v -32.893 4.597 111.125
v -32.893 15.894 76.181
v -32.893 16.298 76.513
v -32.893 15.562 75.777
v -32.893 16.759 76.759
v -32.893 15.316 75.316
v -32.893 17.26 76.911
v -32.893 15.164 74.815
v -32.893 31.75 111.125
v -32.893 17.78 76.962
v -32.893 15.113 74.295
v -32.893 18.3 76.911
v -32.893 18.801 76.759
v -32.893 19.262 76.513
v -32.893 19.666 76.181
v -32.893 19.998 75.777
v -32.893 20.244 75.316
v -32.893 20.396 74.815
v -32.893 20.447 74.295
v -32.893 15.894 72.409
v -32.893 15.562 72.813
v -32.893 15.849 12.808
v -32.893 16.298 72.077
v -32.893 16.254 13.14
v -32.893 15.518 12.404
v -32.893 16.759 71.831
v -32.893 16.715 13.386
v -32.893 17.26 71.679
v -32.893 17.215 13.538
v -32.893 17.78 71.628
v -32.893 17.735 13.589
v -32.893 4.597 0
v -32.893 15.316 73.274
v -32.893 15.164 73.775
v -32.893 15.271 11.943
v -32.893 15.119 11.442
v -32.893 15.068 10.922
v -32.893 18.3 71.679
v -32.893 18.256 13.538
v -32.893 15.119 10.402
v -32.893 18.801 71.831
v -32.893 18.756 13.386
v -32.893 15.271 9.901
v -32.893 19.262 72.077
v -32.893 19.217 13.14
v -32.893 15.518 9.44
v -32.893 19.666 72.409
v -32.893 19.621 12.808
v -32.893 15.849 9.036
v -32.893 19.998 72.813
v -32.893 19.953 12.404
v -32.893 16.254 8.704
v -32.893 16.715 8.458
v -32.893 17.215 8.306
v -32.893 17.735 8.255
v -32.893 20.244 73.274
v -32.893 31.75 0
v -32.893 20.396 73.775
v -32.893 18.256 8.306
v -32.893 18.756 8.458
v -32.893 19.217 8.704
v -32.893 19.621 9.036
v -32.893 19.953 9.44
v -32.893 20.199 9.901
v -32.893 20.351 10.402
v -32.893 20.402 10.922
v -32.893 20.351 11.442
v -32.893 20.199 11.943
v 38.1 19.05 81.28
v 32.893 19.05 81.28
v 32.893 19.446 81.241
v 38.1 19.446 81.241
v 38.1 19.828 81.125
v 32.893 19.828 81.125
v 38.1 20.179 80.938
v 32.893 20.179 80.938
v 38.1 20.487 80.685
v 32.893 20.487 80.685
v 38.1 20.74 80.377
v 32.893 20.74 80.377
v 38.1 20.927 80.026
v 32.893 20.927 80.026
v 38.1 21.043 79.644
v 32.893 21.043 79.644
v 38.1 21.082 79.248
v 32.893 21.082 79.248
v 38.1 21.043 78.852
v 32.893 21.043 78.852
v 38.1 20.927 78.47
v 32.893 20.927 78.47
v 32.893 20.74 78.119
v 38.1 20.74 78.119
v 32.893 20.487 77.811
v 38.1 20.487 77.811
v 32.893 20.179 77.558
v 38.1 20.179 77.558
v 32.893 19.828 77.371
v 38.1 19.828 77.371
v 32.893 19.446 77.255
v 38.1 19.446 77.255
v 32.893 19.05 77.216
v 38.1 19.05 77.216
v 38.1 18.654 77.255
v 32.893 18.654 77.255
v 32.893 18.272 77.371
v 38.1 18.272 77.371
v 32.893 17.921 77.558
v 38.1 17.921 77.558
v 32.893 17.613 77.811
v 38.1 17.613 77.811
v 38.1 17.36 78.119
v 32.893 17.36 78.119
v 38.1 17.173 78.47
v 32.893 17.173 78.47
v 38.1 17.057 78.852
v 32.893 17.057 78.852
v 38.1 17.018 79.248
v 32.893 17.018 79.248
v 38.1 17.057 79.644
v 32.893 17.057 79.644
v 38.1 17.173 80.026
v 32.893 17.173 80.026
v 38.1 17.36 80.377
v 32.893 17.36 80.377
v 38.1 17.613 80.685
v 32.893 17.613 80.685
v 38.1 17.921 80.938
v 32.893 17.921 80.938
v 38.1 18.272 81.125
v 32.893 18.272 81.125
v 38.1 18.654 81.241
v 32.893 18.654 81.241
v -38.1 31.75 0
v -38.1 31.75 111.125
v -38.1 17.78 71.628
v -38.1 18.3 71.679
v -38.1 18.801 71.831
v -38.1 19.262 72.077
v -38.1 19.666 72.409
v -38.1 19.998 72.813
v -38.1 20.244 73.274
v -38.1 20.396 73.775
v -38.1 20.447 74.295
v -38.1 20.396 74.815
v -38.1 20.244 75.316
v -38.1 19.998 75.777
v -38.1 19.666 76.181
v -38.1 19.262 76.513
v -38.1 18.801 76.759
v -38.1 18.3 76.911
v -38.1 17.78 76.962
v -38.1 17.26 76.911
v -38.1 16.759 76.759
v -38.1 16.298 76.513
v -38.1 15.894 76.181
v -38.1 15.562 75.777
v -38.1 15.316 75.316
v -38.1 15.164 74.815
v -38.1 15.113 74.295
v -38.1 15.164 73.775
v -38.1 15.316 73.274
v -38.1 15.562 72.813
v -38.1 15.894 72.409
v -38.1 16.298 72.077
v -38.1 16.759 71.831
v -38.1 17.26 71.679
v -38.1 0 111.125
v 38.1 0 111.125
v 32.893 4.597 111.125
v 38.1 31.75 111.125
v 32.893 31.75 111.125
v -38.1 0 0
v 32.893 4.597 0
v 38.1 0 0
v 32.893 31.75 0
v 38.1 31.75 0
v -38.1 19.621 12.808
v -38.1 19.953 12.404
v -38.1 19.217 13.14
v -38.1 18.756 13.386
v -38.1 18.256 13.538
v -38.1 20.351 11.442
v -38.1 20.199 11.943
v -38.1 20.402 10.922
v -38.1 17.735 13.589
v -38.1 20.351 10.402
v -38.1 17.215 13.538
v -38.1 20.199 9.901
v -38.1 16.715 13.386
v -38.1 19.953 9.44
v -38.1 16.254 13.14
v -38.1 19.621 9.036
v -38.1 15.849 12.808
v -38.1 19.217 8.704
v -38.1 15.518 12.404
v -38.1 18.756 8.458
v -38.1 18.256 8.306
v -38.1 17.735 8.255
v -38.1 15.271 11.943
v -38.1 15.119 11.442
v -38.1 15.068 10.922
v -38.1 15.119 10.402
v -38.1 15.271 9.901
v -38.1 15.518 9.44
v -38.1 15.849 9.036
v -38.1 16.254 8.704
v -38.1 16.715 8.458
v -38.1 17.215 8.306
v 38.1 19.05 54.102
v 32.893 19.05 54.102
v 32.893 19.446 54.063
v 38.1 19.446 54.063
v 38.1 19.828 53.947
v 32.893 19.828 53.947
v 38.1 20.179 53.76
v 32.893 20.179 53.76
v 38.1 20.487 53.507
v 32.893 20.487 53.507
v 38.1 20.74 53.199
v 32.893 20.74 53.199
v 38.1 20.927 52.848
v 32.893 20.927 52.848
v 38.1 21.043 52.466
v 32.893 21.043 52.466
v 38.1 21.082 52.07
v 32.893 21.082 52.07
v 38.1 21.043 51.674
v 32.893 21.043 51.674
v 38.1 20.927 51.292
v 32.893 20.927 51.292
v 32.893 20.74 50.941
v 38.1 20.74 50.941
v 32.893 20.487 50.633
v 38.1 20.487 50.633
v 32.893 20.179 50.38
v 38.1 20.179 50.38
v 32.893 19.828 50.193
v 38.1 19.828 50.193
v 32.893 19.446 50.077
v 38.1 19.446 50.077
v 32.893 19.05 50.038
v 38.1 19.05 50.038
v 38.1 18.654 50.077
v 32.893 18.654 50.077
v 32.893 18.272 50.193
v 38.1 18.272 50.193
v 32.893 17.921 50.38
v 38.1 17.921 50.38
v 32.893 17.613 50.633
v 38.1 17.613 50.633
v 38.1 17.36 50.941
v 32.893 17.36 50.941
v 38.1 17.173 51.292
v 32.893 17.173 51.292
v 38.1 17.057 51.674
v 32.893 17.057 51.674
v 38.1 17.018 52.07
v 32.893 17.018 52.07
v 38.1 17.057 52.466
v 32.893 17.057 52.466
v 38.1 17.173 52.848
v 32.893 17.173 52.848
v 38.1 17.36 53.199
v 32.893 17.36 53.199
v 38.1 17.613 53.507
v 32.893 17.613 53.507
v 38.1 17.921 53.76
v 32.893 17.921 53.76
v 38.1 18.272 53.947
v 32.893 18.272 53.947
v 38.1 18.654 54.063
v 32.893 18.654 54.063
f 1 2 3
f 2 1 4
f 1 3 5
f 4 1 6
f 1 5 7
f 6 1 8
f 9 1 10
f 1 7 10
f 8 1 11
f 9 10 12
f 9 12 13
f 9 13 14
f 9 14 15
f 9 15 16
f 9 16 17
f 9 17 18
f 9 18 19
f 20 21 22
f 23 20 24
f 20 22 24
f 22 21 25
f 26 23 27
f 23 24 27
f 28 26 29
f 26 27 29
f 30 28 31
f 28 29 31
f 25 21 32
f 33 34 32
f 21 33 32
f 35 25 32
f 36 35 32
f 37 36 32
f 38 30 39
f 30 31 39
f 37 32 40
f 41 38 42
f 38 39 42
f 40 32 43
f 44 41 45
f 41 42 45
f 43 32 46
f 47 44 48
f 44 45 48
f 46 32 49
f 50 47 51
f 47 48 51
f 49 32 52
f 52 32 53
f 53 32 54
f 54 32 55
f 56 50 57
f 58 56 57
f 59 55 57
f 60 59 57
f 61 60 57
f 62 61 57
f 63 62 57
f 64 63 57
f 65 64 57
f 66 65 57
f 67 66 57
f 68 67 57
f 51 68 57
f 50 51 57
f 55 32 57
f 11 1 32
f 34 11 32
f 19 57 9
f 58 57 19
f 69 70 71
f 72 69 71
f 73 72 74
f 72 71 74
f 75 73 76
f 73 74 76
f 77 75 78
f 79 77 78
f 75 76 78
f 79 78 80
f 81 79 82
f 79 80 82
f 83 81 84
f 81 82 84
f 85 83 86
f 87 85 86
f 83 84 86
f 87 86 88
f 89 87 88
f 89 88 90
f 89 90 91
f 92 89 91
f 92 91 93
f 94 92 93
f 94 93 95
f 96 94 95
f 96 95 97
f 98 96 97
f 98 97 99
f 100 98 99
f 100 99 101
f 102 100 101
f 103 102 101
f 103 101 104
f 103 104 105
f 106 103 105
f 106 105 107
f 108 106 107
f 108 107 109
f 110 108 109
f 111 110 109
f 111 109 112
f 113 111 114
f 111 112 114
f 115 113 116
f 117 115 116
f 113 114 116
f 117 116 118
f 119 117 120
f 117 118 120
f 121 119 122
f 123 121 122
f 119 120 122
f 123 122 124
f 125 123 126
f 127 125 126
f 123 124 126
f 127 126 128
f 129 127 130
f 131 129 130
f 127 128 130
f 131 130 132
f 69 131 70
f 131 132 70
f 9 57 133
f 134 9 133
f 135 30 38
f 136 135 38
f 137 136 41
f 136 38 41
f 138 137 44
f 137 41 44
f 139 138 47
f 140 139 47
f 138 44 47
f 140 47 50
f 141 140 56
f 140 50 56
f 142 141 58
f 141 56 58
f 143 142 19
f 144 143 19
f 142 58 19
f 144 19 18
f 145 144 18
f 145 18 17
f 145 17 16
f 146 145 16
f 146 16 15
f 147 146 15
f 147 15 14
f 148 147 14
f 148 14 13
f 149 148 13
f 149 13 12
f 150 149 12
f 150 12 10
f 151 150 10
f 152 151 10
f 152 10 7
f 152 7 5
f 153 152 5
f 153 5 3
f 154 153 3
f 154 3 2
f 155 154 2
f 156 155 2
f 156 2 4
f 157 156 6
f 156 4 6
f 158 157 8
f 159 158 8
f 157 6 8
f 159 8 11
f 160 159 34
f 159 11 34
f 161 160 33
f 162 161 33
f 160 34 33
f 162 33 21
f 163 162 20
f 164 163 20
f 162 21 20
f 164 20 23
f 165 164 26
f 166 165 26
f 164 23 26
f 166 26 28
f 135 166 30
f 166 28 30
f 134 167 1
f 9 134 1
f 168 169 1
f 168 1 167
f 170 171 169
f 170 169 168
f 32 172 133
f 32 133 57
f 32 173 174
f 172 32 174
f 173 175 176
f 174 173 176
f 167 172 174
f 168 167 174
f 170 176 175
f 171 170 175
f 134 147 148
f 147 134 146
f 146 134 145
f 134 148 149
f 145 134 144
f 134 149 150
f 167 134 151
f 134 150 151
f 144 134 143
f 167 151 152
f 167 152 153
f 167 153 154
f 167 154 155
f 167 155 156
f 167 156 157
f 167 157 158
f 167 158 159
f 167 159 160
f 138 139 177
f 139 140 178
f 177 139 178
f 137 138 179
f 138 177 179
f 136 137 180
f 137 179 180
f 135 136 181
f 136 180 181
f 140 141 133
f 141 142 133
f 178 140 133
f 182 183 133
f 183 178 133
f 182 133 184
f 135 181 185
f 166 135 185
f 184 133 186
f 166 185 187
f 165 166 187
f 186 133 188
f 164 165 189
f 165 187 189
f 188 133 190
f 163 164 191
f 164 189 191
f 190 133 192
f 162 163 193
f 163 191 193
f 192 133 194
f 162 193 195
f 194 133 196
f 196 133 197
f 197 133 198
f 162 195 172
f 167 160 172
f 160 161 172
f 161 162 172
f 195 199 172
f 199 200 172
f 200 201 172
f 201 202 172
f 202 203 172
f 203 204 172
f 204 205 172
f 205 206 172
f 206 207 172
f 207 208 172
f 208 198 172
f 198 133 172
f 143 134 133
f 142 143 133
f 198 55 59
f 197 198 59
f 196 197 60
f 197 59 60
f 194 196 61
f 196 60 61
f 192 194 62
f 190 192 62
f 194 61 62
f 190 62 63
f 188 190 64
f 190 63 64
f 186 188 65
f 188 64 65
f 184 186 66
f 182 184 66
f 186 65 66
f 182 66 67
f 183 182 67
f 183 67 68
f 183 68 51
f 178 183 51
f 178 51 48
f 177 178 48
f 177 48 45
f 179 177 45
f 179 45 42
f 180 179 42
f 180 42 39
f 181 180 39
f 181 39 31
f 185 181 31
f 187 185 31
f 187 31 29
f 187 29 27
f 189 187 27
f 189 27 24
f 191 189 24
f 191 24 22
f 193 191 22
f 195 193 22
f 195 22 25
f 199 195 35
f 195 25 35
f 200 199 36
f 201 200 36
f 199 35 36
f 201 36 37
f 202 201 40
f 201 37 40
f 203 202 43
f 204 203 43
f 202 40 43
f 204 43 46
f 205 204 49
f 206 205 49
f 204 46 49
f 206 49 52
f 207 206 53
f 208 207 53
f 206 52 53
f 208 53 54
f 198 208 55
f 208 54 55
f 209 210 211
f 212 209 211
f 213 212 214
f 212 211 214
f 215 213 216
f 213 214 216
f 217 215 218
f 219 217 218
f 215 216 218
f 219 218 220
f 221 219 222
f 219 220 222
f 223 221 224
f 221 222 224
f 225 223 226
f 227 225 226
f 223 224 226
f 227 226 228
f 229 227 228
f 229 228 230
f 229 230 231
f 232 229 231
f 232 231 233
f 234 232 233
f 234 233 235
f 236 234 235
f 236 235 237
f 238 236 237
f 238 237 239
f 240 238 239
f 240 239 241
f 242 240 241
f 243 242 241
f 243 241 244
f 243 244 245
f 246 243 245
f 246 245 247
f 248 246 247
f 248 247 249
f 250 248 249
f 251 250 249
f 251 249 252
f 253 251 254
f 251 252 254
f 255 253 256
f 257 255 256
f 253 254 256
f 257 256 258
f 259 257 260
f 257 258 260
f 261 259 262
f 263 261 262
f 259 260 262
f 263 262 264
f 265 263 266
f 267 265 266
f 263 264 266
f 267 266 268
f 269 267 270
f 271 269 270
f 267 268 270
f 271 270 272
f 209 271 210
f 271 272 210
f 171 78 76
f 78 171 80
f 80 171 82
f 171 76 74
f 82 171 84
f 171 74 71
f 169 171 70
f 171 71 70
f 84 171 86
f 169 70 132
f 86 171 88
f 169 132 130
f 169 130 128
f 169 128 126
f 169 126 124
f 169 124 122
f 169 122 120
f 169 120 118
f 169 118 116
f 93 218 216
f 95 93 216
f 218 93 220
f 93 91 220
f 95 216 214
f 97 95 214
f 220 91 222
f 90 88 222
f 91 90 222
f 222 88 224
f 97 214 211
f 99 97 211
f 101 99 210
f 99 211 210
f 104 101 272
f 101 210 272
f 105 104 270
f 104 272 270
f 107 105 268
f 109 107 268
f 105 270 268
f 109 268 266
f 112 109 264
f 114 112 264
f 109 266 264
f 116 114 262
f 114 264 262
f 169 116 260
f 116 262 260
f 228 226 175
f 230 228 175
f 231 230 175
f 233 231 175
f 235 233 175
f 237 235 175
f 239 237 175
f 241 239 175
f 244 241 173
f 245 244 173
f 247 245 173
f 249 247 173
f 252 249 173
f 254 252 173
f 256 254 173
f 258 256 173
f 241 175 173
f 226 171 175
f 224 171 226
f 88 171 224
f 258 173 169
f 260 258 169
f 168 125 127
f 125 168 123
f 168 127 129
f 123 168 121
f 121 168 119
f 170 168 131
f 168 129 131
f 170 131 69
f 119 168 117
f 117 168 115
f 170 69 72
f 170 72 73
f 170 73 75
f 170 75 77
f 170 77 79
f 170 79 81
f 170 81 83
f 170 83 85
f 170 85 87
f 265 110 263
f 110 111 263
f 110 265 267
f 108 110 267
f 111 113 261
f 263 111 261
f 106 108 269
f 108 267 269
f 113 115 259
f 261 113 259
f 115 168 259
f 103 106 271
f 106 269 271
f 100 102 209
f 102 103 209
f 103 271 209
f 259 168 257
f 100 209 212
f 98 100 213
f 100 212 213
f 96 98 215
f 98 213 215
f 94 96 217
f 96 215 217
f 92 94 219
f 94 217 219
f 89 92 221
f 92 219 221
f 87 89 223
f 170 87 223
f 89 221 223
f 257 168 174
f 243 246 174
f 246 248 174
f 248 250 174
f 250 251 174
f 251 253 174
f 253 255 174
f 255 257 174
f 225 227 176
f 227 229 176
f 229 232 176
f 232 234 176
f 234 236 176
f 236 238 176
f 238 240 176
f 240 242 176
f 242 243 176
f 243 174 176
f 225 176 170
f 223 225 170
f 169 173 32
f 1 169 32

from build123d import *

# Parameters (mm, degrees)
BOSS_EXTRUDE3_DEPTH = 111.125
SKETCH4_R           = 2.667
CUT_EXTRUDE1_DEPTH  = 136.634929771
SKETCH5_R           = 2.667
CUT_EXTRUDE2_DEPTH  = 136.634929771
SKETCH6_R           = 2.032
CUT_EXTRUDE3_DEPTH  = 136.634929771
SKETCH7_R           = 2.032
CUT_EXTRUDE4_DEPTH  = 136.634929771


with BuildPart() as part:
    # Sketch2 → Boss-Extrude3 (new body)
    with BuildSketch(Plane.XY):
        Polygon((-38.1, 0), (38.1, 0), (38.1, 31.75), (32.893, 31.75), (32.893, 4.5974), (-32.893, 4.5974), (-32.893, 31.75), (-38.1, 31.75), align=None)
    extrude(amount=BOSS_EXTRUDE3_DEPTH)

    # Sketch4 → Cut-Extrude1 (cut, through all)
    with BuildSketch(Plane(origin=(-32.893, 0, 0), x_dir=(0, 0, -1), z_dir=(1, 0, 0))):
        with Locations((-10.922, 17.735211787)):
            Circle(SKETCH4_R)
    extrude(amount=-CUT_EXTRUDE1_DEPTH, mode=Mode.SUBTRACT)

    # Sketch5 → Cut-Extrude2 (cut, through all)
    with BuildSketch(Plane(origin=(-32.893, 0, 0), x_dir=(0, 0, -1), z_dir=(1, 0, 0))):
        with Locations((-74.295, 17.78)):
            Circle(SKETCH5_R)
    extrude(amount=-CUT_EXTRUDE2_DEPTH, mode=Mode.SUBTRACT)

    # Sketch6 → Cut-Extrude3 (cut, through all)
    with BuildSketch(Plane.ZY.offset(-32.893)):
        with Locations((52.07, 19.05)):
            Circle(SKETCH6_R)
    extrude(amount=-CUT_EXTRUDE3_DEPTH, mode=Mode.SUBTRACT)

    # Sketch7 → Cut-Extrude4 (cut, through all)
    with BuildSketch(Plane.ZY.offset(-32.893)):
        with Locations((79.248, 19.05)):
            Circle(SKETCH7_R)
    extrude(amount=-CUT_EXTRUDE4_DEPTH, mode=Mode.SUBTRACT)


solid = part.part
